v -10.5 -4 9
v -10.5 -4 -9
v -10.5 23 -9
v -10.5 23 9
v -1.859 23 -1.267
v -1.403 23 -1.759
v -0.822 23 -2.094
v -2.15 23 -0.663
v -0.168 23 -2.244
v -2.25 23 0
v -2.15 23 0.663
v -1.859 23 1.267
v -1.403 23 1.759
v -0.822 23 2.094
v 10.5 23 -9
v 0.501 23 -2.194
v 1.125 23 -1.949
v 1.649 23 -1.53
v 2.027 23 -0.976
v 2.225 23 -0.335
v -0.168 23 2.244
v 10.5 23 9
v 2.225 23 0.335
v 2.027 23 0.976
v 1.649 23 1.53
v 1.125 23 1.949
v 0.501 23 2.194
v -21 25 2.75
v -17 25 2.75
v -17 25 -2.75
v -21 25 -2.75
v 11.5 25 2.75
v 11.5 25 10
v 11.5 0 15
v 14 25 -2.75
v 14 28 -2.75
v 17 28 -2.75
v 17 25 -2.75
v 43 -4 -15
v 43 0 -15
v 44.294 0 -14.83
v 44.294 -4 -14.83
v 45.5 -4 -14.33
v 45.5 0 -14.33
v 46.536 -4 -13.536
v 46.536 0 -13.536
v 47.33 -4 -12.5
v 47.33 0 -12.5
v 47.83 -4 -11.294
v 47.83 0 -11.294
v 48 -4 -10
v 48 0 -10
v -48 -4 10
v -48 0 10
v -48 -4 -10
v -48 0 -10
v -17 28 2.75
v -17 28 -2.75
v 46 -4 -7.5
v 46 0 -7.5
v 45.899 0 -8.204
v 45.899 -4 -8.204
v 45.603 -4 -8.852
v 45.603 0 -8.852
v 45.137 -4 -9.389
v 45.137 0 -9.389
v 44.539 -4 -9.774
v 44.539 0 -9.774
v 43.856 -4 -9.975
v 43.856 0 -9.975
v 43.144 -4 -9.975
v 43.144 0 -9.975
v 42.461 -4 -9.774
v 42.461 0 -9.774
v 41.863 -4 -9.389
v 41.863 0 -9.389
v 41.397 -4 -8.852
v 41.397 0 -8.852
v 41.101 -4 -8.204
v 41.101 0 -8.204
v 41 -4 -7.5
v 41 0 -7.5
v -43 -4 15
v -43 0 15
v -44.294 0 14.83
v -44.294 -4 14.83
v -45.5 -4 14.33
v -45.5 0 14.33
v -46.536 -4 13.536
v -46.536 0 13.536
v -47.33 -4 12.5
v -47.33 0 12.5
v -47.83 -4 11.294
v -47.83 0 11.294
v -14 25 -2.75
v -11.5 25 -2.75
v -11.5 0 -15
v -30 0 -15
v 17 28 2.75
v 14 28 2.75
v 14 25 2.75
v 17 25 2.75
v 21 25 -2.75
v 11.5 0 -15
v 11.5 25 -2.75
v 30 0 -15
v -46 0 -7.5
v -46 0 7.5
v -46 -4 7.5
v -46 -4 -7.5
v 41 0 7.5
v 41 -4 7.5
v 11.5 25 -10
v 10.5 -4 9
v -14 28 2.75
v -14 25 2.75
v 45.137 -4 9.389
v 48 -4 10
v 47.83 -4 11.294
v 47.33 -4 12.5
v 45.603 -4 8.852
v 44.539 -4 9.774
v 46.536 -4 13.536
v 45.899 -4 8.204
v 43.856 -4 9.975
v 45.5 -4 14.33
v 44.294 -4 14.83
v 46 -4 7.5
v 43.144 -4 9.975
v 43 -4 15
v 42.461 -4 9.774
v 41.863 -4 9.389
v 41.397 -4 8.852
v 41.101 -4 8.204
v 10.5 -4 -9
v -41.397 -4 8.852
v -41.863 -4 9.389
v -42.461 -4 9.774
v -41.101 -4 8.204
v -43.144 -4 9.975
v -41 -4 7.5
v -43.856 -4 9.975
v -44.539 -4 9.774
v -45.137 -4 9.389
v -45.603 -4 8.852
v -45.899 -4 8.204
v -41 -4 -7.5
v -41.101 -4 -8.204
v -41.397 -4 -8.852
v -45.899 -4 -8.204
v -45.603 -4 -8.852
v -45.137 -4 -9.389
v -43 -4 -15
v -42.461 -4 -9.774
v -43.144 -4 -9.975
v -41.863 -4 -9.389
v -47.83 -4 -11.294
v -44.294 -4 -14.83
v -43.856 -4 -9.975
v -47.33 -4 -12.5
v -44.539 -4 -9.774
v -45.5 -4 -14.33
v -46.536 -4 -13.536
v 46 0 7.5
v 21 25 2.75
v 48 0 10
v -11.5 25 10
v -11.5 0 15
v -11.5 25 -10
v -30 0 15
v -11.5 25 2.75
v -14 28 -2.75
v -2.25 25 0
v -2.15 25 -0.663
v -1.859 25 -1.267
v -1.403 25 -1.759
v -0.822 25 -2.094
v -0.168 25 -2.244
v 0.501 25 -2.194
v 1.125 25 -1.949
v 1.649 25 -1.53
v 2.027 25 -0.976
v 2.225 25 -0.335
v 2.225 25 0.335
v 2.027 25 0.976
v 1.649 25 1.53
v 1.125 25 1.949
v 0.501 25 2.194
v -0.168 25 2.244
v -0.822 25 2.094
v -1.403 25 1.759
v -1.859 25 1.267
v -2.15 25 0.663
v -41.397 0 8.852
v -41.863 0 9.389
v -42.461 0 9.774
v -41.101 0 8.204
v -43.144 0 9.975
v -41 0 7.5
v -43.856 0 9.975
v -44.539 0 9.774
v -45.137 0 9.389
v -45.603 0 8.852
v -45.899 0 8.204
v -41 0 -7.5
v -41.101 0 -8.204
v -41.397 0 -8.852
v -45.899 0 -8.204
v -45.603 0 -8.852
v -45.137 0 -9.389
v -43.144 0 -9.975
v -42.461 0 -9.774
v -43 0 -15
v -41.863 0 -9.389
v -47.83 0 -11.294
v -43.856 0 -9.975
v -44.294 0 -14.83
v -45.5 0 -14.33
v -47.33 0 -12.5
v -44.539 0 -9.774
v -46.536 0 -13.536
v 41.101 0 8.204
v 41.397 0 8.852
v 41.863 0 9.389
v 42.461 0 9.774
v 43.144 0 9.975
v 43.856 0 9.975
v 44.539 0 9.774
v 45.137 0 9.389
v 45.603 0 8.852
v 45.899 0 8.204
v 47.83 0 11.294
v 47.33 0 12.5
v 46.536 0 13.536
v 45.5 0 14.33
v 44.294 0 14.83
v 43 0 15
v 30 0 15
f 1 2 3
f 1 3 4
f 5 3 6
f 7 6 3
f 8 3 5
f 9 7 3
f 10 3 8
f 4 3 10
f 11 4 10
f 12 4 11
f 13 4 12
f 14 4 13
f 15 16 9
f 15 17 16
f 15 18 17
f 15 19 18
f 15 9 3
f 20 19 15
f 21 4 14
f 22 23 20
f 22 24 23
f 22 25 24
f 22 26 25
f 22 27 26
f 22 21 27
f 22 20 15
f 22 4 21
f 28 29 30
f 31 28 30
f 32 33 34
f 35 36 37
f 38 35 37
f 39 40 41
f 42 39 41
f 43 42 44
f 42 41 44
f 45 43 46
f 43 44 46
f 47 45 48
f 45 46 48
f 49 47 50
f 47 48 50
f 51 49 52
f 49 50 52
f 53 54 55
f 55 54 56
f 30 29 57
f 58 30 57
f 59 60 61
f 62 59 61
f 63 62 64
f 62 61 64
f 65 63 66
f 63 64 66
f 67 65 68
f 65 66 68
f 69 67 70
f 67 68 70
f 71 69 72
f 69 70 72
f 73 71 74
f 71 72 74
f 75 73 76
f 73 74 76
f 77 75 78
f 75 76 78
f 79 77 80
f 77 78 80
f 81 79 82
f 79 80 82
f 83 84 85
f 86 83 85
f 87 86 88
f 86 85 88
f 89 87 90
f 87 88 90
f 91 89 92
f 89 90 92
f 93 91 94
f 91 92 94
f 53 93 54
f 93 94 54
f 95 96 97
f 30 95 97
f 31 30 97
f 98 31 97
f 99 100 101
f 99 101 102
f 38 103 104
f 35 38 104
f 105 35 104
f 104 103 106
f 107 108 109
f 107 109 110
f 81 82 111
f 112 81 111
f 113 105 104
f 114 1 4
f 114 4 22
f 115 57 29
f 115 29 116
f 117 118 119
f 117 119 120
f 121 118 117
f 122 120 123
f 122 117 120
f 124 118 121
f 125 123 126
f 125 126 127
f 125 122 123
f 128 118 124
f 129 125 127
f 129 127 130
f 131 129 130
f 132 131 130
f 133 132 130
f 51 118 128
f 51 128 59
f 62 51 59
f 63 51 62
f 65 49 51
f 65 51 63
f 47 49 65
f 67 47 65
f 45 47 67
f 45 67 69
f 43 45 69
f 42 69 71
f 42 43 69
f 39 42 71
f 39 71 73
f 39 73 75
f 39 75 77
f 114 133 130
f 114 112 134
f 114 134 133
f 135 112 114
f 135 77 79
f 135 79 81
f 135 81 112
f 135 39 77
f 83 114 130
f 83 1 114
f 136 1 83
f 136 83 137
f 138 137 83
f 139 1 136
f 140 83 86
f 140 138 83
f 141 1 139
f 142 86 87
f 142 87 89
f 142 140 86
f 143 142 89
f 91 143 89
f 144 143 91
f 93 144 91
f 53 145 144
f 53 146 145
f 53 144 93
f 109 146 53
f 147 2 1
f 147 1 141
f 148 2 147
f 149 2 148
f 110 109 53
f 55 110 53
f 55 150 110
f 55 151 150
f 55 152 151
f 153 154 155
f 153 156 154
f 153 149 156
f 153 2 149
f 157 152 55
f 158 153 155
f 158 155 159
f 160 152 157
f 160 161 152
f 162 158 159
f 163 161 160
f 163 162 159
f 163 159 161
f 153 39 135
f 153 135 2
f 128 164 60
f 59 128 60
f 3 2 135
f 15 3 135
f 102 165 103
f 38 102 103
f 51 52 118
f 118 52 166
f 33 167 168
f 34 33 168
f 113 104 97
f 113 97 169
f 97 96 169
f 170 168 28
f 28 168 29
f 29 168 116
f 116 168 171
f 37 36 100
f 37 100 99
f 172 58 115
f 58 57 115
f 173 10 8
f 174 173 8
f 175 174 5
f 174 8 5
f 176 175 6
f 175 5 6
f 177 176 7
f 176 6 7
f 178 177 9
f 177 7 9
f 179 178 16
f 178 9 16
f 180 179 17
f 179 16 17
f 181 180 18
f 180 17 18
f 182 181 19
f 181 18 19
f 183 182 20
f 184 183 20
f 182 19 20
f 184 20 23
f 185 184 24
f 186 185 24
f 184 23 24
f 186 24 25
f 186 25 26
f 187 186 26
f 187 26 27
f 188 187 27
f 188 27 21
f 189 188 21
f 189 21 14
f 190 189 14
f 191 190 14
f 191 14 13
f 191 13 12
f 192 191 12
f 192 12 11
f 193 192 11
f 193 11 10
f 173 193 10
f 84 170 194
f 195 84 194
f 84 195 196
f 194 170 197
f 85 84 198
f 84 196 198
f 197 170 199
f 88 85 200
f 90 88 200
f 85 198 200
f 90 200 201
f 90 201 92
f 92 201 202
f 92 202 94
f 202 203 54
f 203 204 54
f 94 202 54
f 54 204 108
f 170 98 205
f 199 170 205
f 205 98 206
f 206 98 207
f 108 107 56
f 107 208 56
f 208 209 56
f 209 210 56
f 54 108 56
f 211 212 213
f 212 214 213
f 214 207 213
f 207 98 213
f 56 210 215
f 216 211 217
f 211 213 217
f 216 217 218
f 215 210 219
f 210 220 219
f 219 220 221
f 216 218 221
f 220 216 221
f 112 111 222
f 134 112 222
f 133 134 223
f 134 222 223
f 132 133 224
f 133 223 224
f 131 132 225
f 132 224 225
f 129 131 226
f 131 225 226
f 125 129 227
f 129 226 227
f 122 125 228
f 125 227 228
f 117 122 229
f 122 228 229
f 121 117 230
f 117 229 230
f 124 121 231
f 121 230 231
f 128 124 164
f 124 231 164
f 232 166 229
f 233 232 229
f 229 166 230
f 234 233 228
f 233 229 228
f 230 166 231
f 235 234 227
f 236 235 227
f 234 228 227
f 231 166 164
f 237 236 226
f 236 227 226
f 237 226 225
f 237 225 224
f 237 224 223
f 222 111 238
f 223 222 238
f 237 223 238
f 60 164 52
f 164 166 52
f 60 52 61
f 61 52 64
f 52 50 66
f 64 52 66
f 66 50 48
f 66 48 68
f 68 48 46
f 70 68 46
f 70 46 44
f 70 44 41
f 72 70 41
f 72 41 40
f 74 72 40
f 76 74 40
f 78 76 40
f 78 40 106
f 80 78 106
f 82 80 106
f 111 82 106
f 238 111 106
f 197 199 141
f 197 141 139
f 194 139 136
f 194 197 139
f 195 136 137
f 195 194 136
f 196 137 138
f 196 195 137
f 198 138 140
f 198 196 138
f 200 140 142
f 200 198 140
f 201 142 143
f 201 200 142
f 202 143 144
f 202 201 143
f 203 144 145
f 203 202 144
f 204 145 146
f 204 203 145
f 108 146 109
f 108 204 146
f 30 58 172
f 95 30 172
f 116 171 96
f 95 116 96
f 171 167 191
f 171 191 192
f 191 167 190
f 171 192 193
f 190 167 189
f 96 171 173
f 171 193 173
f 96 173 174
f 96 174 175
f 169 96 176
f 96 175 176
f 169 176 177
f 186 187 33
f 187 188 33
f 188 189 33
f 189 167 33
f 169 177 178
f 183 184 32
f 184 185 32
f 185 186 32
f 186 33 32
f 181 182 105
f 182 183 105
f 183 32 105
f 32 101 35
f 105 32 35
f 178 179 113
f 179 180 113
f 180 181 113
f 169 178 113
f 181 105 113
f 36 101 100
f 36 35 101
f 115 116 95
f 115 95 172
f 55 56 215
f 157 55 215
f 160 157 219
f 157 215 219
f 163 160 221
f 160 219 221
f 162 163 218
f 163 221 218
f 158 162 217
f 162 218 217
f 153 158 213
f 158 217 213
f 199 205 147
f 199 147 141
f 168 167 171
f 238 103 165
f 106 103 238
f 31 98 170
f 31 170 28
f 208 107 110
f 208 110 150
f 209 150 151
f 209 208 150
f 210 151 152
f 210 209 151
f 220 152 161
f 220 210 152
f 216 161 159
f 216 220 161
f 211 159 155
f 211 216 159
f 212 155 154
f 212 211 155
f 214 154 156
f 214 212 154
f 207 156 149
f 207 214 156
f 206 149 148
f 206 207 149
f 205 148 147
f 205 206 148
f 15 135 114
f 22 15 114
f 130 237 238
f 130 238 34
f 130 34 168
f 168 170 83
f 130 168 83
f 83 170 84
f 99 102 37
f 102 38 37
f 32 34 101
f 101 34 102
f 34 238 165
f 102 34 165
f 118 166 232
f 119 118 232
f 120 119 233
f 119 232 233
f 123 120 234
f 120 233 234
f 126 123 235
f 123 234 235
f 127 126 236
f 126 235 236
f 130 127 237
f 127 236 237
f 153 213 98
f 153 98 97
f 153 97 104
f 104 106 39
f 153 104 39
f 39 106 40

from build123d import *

# Parameters (mm, degrees)
BOSS_EXTRUDE1_DEPTH     = 4
BOSS_EXTRUDE2_DEPTH     = 30
BOSS_EXTRUDE3_DEPTH     = 11.5
CUT_EXTRUDE1_DEPTH      = 57.160484328
CUT_EXTRUDE1_DEPTH_BACK = 57.160484328
SKETCH4_3_W             = 3
SKETCH4_3_H             = 3
BOSS_EXTRUDE4_DEPTH     = 2.75
SKETCH5_W               = 21
SKETCH5_H               = 18
CUT_EXTRUDE3_DEPTH      = 27
M4_CLEARANCE_HOLE1_D    = 4.5


with BuildPart() as part:
    # Sketch2 → Boss-Extrude1 (new body)
    with BuildSketch(Plane(origin=(0, 0, 0), x_dir=(1, 0, 0), z_dir=(0, 1, 0))):
        with BuildLine():
            Line((-43, 15), (43, 15))
            ThreePointArc((43, 15), (46.535533906, 13.535533906), (48, 10))
            Line((48, 10), (48, -10))
            ThreePointArc((48, -10), (46.535533906, -13.535533906), (43, -15))
            Line((43, -15), (-43, -15))
            ThreePointArc((-43, -15), (-46.535533906, -13.535533906), (-48, -10))
            Line((-48, -10), (-48, 10))
            ThreePointArc((-48, 10), (-46.535533906, 13.535533906), (-43, 15))
        make_face()
        with BuildLine():
            Line((-46, -7.5), (-46, 7.5))
            ThreePointArc((-46, 7.5), (-43.5, 10), (-41, 7.5))
            Line((-41, 7.5), (-41, -7.5))
            ThreePointArc((-41, -7.5), (-43.5, -10), (-46, -7.5))
        make_face(mode=Mode.SUBTRACT)
        with BuildLine():
            Line((46, -7.5), (46, 7.5))
            ThreePointArc((46, 7.5), (43.5, 10), (41, 7.5))
            Line((41, 7.5), (41, -7.5))
            ThreePointArc((41, -7.5), (43.5, -10), (46, -7.5))
        make_face(mode=Mode.SUBTRACT)
    extrude(amount=-BOSS_EXTRUDE1_DEPTH)

    # Sketch3 → Boss-Extrude2 (add, symmetric)
    with BuildSketch(Plane(origin=(0, 0, 0), x_dir=(0, 0, -1), z_dir=(1, 0, 0))):
        Polygon((-15, 0), (-2.75, 25), (2.75, 25), (15, 0), align=None)
    extrude(amount=BOSS_EXTRUDE2_DEPTH, both=True)

    # Sketch3<3> → Boss-Extrude3 (add, symmetric)
    with BuildSketch(Plane(origin=(0, 0, 0), x_dir=(0, 0, -1), z_dir=(1, 0, 0))):
        Polygon((-10, 25), (-15, 0), (-2.75, 25), align=None)
        Polygon((2.75, 25), (15, 0), (10, 25), align=None)
    extrude(amount=BOSS_EXTRUDE3_DEPTH, both=True)

    # Sketch4 → Cut-Extrude1 (cut, two sides: drawn at the far end of the back side and taken through both)
    with BuildSketch(Plane.XY.offset(-CUT_EXTRUDE1_DEPTH_BACK)):
        Polygon((21, 25), (30, 0), (30, 25), align=None)
        Polygon((-30, 25), (-30, 0), (-21, 25), align=None)
    extrude(amount=CUT_EXTRUDE1_DEPTH + CUT_EXTRUDE1_DEPTH_BACK, mode=Mode.SUBTRACT)

    # Sketch4<3> → Boss-Extrude4 (add, symmetric)
    with BuildSketch(Plane.XY):
        with Locations((15.5, 26.5)):
            Rectangle(SKETCH4_3_W, SKETCH4_3_H)
        with Locations((-15.5, 26.5)):
            Rectangle(SKETCH4_3_W, SKETCH4_3_H)
    extrude(amount=BOSS_EXTRUDE4_DEPTH, both=True)

    # Sketch5 → Cut-Extrude3 (cut)
    with BuildSketch(Plane.XZ.offset(4)):
        Rectangle(SKETCH5_W, SKETCH5_H)
    extrude(amount=-CUT_EXTRUDE3_DEPTH, mode=Mode.SUBTRACT)

    # M4 Clearance Hole1 (through all)
    with Locations(Plane(origin=(0, 25, 0), x_dir=(1, 0, 0), z_dir=(0, 1, 0))):
        with Locations((0, 0)):
            Hole(M4_CLEARANCE_HOLE1_D / 2)


solid = part.part
